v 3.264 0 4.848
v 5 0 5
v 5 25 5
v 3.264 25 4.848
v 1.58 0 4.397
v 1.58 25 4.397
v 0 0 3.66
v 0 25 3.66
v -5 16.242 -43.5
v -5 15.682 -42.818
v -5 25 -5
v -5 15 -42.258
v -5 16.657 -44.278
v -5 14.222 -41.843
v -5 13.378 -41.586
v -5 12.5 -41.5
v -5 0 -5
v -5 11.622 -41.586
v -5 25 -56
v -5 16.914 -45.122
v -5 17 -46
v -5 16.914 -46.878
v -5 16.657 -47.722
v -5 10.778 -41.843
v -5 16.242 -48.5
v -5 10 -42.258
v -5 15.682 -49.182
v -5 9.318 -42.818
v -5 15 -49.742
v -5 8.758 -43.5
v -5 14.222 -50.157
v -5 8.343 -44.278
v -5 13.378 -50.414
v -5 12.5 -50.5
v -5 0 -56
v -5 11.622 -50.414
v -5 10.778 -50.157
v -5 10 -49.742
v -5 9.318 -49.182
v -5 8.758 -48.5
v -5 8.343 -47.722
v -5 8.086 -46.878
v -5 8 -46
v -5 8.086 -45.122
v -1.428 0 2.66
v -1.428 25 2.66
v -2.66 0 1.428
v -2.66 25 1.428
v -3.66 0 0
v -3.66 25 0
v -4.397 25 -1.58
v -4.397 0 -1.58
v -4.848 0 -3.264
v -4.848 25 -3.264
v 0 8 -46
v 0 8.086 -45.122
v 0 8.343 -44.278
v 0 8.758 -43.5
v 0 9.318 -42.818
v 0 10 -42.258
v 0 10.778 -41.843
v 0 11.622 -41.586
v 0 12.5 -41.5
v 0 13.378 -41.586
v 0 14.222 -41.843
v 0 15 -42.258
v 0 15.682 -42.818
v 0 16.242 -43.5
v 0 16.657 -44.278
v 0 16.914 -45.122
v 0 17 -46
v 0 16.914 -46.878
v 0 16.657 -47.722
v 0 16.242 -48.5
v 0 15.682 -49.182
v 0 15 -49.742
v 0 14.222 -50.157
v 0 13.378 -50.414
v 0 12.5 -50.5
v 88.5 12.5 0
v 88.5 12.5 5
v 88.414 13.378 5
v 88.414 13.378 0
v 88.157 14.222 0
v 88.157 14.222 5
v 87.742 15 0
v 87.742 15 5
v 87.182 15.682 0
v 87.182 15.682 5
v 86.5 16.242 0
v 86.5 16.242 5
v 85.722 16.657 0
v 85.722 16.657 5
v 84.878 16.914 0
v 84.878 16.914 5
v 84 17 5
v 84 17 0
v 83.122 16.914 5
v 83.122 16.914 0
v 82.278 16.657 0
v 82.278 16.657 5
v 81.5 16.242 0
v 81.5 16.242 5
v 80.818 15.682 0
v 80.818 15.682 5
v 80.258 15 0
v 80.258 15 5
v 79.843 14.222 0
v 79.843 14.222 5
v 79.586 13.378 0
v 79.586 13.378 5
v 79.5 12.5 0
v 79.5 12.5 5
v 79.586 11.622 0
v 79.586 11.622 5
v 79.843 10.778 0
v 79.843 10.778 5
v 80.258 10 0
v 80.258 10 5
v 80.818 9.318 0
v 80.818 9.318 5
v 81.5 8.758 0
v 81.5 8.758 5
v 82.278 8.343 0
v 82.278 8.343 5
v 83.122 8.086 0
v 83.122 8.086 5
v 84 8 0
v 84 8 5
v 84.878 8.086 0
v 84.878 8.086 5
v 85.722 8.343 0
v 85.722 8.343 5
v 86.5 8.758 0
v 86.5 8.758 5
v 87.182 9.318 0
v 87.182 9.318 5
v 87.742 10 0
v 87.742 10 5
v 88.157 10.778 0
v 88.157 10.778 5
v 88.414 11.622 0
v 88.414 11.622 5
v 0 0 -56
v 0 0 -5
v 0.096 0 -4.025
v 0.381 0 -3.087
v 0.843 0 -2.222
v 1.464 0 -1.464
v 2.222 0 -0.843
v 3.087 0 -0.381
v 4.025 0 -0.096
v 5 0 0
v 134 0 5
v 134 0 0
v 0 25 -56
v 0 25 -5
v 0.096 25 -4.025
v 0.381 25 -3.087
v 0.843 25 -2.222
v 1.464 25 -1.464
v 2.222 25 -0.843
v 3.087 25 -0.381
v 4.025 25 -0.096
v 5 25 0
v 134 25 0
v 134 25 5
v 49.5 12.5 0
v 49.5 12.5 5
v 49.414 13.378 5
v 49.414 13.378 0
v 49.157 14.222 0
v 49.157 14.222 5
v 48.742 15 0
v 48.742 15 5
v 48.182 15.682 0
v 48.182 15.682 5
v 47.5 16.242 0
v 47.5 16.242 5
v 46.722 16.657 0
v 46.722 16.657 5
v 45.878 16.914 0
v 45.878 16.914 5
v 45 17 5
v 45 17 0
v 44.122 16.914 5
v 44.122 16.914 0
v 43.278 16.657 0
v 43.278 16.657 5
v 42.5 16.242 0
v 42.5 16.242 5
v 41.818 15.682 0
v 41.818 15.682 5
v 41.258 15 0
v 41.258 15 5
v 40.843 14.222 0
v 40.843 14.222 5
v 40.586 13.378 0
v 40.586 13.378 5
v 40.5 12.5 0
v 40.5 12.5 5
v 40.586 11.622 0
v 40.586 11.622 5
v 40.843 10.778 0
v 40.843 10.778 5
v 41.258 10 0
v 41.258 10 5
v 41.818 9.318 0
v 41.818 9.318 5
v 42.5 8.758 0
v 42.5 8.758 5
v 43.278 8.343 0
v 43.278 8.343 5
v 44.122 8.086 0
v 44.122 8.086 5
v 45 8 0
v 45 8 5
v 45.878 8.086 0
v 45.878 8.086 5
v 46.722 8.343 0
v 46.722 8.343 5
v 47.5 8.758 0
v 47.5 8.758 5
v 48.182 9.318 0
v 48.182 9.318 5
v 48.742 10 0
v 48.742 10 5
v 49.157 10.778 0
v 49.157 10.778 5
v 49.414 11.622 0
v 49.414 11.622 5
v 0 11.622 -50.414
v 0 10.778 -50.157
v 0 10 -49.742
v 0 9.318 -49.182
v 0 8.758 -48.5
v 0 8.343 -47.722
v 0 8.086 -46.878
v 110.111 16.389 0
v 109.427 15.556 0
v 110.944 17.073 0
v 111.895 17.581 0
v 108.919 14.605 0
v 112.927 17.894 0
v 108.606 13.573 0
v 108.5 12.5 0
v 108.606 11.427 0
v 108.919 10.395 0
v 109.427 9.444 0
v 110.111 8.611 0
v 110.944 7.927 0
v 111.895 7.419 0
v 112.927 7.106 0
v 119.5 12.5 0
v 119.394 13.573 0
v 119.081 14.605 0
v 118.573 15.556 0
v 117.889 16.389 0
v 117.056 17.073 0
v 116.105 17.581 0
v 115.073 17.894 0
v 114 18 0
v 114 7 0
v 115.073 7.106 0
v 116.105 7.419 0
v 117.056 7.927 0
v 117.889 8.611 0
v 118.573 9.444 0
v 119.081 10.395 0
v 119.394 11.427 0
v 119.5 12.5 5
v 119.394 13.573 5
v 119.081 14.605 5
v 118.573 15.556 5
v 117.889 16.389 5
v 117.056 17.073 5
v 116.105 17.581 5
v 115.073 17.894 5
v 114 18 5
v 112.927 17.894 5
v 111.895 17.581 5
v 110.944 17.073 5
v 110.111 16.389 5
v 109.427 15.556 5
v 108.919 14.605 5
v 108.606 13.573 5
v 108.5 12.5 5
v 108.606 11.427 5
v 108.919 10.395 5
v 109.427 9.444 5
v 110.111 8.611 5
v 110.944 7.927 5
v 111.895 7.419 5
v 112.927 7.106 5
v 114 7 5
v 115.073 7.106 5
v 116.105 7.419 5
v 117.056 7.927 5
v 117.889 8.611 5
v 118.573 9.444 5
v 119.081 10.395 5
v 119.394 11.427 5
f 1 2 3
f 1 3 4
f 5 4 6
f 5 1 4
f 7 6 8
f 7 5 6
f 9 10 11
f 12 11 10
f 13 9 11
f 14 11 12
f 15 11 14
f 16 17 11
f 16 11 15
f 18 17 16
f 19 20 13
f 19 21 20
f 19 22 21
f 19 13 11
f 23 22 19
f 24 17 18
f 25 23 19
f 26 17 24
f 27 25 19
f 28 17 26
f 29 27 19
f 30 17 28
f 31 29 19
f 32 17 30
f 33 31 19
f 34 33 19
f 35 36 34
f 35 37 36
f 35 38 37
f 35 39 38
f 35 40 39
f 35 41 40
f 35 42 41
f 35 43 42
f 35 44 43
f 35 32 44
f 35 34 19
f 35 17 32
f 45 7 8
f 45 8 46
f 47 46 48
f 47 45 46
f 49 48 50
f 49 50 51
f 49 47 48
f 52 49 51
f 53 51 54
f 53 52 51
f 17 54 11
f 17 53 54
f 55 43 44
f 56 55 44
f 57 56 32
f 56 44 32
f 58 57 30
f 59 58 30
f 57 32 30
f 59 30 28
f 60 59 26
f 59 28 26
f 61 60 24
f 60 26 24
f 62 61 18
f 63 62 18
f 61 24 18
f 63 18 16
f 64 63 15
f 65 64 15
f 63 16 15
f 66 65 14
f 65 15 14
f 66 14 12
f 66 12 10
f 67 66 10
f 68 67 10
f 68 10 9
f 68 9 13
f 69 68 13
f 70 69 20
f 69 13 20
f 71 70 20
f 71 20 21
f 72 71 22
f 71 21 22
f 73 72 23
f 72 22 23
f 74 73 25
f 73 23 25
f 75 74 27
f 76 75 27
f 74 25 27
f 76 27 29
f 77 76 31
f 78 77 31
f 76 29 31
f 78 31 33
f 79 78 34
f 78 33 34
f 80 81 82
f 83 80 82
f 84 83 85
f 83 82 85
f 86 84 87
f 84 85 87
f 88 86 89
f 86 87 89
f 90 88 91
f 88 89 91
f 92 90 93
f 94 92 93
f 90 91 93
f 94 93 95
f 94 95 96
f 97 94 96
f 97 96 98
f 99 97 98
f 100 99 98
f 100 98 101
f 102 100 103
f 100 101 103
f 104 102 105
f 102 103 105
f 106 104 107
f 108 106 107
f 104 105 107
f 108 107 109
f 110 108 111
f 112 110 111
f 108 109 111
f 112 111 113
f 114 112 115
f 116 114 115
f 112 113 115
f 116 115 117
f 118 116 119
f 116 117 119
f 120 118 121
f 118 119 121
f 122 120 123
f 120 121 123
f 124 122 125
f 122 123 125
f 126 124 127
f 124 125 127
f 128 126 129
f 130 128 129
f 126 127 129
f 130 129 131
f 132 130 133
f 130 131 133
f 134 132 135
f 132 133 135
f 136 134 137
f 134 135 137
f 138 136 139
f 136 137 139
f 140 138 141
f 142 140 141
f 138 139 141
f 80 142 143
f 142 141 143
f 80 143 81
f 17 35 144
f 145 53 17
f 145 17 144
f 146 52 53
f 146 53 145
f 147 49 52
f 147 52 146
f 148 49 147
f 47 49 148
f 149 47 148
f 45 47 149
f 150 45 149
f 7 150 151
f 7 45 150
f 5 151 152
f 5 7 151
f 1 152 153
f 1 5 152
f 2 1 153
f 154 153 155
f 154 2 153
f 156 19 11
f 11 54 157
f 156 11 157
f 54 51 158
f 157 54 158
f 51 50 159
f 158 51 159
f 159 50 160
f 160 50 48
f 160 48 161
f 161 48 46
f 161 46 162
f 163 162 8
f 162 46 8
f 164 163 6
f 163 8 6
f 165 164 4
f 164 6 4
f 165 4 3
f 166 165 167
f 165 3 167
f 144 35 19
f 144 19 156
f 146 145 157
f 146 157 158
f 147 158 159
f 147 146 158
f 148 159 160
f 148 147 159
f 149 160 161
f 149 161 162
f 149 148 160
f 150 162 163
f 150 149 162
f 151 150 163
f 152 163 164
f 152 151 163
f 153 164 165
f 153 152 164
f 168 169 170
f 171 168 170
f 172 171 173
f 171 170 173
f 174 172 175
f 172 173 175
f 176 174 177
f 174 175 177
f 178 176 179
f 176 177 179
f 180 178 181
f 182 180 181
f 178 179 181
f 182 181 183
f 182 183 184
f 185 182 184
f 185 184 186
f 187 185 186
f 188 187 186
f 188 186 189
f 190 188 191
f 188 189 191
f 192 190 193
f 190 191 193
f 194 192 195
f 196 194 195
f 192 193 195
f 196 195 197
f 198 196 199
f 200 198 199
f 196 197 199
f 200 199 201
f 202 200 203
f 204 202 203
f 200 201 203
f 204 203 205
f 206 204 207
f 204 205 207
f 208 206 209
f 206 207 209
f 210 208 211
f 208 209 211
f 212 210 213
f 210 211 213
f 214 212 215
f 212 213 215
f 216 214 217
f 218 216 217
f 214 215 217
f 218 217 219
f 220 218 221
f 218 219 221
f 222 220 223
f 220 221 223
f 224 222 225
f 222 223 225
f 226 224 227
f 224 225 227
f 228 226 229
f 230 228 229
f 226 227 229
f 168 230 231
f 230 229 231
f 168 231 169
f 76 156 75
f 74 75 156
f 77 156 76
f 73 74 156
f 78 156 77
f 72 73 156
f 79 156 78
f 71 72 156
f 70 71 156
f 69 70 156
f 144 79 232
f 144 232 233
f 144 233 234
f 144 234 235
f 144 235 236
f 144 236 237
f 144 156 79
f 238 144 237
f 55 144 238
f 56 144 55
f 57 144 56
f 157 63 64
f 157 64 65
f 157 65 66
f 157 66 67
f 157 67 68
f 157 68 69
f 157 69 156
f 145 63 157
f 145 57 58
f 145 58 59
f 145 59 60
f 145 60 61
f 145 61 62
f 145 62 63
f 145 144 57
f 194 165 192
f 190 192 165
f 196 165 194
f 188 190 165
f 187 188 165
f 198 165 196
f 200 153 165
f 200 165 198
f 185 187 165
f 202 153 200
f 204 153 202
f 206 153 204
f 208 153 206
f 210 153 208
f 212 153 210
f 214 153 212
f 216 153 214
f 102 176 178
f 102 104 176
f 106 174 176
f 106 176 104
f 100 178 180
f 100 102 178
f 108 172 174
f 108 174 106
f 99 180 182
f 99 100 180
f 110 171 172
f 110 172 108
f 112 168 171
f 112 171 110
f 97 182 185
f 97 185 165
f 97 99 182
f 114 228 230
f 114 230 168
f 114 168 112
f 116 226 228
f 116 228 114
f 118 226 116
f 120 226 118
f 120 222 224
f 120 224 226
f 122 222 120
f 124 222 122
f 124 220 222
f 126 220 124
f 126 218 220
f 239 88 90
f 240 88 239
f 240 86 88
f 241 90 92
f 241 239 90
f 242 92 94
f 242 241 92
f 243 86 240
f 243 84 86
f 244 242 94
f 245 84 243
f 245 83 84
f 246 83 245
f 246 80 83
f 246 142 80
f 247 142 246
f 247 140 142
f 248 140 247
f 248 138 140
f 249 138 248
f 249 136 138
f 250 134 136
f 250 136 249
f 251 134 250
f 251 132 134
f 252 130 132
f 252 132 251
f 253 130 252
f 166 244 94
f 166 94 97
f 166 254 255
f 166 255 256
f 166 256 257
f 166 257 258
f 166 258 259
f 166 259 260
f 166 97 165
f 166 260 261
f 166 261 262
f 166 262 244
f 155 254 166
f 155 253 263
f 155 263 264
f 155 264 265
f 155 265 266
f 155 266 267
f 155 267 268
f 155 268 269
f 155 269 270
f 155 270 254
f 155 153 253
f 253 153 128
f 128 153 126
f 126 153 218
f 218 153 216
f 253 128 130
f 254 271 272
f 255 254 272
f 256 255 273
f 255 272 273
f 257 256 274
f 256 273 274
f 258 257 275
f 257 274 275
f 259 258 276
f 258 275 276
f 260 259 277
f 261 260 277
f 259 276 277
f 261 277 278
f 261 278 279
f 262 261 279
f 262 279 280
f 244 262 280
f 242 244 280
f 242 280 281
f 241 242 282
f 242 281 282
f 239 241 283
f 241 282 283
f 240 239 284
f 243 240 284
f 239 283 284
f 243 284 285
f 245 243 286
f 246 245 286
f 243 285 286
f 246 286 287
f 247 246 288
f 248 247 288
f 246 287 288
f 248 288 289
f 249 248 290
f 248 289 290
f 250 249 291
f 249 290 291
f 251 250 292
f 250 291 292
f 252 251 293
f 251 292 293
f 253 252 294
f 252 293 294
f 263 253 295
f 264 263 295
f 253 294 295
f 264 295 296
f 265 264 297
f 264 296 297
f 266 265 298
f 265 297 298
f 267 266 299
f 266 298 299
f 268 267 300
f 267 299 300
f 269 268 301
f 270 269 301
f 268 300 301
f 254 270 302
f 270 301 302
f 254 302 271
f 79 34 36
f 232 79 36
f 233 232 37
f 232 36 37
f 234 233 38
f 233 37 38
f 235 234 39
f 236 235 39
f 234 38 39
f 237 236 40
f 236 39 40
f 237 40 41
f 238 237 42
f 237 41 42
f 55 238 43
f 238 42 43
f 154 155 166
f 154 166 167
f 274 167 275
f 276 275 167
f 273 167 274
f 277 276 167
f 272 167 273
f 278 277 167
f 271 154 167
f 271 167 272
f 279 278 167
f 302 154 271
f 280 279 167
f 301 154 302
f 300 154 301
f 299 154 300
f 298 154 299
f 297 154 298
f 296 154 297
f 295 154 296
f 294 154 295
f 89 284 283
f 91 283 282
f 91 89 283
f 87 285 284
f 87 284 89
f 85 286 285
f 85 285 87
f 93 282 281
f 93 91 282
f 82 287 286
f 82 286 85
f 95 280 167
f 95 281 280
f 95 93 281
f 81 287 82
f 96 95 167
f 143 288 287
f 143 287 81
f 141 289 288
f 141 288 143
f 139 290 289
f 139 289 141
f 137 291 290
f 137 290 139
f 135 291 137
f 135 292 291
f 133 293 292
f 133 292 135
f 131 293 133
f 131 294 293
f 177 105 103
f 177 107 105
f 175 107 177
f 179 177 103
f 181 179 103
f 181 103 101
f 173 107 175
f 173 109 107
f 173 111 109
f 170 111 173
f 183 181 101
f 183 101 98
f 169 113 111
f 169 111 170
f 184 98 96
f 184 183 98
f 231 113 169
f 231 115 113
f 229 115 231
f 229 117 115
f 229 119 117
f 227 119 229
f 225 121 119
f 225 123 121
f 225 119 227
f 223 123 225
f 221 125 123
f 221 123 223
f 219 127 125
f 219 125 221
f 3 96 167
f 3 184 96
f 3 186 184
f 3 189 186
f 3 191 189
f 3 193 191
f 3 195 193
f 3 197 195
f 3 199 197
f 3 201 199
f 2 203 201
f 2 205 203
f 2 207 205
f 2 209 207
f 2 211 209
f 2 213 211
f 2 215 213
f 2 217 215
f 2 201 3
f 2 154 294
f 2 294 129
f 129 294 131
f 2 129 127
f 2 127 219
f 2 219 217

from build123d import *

# Parameters (mm, degrees)
F1_DEPTH = 25
F2_R     = 5.5
F2_R_2   = 4.5
F3_DEPTH = 5
F4_DEPTH = 5
F6_DEPTH = 5


# Not quite as in the source:
# - ends of sketch curves that miss each other by under 0.0002 mm in the source are joined


with BuildPart() as f1:
    # F0 (on Front) → F1 (new body)
    with BuildSketch(Plane.XZ):
        with BuildLine():
            Line((134, 0), (134, 5))
            Line((134, 5), (5, 5))
            ThreePointArc((5, 5), (2.4118095455, 4.6592580848), (0, 3.6602538402))
            Line((0, 3.6602538402), (0, 0))
            Line((0, 0), (5, 0))
            Line((5, 0), (134, 0))
        make_face()
        with BuildLine():
            Line((0, 0), (0, 3.6602538402))
            ThreePointArc((0, 3.6602538402), (-3.6602539143, -1.284e-07), (-4.9999998289, -5))
            Line((-4.9999998289, -5), (-5, -56))
            Line((-5, -56), (0, -56))
            Line((0, -56), (0, -5))
            Line((0, -5), (0, 0))
        make_face()
        with BuildLine():
            ThreePointArc((0, -5), (1.4644660941, -1.4644660941), (5, 0))
            Line((5, 0), (0, 0))
            Line((0, 0), (0, -5))
        make_face()
    extrude(amount=-F1_DEPTH)

    # F2 (on face) → F3 (cut)
    with BuildSketch(Plane.XY.offset(5)):
        with Locations((114, 12.5)):
            Circle(F2_R)
        with Locations((84, 12.5)):
            Circle(F2_R_2)
        with Locations((45, 12.5)):
            Circle(F2_R_2)
    extrude(amount=-F3_DEPTH, mode=Mode.SUBTRACT)

    # F2 (on face) → F4 (cut)
    with BuildSketch(Plane.XY.offset(5)):
        with Locations((114, 12.5)):
            Circle(F2_R)
        with Locations((84, 12.5)):
            Circle(F2_R_2)
        with Locations((45, 12.5)):
            Circle(F2_R_2)
    extrude(amount=-F4_DEPTH, mode=Mode.SUBTRACT)

    # F5 (on face) → F6 (cut)
    with BuildSketch(Plane(origin=(-5, 0, 0), x_dir=(0, -1, 0), z_dir=(-1, 0, 0))):
        with BuildLine():
            ThreePointArc((-12.5, -50.5), (-9.3180194847, -49.1819805153), (-8, -46))
            ThreePointArc((-8, -46), (-15.6819805153, -42.8180194847), (-12.5, -50.5))
        make_face()
    extrude(amount=-F6_DEPTH, mode=Mode.SUBTRACT)


solid = f1.part
